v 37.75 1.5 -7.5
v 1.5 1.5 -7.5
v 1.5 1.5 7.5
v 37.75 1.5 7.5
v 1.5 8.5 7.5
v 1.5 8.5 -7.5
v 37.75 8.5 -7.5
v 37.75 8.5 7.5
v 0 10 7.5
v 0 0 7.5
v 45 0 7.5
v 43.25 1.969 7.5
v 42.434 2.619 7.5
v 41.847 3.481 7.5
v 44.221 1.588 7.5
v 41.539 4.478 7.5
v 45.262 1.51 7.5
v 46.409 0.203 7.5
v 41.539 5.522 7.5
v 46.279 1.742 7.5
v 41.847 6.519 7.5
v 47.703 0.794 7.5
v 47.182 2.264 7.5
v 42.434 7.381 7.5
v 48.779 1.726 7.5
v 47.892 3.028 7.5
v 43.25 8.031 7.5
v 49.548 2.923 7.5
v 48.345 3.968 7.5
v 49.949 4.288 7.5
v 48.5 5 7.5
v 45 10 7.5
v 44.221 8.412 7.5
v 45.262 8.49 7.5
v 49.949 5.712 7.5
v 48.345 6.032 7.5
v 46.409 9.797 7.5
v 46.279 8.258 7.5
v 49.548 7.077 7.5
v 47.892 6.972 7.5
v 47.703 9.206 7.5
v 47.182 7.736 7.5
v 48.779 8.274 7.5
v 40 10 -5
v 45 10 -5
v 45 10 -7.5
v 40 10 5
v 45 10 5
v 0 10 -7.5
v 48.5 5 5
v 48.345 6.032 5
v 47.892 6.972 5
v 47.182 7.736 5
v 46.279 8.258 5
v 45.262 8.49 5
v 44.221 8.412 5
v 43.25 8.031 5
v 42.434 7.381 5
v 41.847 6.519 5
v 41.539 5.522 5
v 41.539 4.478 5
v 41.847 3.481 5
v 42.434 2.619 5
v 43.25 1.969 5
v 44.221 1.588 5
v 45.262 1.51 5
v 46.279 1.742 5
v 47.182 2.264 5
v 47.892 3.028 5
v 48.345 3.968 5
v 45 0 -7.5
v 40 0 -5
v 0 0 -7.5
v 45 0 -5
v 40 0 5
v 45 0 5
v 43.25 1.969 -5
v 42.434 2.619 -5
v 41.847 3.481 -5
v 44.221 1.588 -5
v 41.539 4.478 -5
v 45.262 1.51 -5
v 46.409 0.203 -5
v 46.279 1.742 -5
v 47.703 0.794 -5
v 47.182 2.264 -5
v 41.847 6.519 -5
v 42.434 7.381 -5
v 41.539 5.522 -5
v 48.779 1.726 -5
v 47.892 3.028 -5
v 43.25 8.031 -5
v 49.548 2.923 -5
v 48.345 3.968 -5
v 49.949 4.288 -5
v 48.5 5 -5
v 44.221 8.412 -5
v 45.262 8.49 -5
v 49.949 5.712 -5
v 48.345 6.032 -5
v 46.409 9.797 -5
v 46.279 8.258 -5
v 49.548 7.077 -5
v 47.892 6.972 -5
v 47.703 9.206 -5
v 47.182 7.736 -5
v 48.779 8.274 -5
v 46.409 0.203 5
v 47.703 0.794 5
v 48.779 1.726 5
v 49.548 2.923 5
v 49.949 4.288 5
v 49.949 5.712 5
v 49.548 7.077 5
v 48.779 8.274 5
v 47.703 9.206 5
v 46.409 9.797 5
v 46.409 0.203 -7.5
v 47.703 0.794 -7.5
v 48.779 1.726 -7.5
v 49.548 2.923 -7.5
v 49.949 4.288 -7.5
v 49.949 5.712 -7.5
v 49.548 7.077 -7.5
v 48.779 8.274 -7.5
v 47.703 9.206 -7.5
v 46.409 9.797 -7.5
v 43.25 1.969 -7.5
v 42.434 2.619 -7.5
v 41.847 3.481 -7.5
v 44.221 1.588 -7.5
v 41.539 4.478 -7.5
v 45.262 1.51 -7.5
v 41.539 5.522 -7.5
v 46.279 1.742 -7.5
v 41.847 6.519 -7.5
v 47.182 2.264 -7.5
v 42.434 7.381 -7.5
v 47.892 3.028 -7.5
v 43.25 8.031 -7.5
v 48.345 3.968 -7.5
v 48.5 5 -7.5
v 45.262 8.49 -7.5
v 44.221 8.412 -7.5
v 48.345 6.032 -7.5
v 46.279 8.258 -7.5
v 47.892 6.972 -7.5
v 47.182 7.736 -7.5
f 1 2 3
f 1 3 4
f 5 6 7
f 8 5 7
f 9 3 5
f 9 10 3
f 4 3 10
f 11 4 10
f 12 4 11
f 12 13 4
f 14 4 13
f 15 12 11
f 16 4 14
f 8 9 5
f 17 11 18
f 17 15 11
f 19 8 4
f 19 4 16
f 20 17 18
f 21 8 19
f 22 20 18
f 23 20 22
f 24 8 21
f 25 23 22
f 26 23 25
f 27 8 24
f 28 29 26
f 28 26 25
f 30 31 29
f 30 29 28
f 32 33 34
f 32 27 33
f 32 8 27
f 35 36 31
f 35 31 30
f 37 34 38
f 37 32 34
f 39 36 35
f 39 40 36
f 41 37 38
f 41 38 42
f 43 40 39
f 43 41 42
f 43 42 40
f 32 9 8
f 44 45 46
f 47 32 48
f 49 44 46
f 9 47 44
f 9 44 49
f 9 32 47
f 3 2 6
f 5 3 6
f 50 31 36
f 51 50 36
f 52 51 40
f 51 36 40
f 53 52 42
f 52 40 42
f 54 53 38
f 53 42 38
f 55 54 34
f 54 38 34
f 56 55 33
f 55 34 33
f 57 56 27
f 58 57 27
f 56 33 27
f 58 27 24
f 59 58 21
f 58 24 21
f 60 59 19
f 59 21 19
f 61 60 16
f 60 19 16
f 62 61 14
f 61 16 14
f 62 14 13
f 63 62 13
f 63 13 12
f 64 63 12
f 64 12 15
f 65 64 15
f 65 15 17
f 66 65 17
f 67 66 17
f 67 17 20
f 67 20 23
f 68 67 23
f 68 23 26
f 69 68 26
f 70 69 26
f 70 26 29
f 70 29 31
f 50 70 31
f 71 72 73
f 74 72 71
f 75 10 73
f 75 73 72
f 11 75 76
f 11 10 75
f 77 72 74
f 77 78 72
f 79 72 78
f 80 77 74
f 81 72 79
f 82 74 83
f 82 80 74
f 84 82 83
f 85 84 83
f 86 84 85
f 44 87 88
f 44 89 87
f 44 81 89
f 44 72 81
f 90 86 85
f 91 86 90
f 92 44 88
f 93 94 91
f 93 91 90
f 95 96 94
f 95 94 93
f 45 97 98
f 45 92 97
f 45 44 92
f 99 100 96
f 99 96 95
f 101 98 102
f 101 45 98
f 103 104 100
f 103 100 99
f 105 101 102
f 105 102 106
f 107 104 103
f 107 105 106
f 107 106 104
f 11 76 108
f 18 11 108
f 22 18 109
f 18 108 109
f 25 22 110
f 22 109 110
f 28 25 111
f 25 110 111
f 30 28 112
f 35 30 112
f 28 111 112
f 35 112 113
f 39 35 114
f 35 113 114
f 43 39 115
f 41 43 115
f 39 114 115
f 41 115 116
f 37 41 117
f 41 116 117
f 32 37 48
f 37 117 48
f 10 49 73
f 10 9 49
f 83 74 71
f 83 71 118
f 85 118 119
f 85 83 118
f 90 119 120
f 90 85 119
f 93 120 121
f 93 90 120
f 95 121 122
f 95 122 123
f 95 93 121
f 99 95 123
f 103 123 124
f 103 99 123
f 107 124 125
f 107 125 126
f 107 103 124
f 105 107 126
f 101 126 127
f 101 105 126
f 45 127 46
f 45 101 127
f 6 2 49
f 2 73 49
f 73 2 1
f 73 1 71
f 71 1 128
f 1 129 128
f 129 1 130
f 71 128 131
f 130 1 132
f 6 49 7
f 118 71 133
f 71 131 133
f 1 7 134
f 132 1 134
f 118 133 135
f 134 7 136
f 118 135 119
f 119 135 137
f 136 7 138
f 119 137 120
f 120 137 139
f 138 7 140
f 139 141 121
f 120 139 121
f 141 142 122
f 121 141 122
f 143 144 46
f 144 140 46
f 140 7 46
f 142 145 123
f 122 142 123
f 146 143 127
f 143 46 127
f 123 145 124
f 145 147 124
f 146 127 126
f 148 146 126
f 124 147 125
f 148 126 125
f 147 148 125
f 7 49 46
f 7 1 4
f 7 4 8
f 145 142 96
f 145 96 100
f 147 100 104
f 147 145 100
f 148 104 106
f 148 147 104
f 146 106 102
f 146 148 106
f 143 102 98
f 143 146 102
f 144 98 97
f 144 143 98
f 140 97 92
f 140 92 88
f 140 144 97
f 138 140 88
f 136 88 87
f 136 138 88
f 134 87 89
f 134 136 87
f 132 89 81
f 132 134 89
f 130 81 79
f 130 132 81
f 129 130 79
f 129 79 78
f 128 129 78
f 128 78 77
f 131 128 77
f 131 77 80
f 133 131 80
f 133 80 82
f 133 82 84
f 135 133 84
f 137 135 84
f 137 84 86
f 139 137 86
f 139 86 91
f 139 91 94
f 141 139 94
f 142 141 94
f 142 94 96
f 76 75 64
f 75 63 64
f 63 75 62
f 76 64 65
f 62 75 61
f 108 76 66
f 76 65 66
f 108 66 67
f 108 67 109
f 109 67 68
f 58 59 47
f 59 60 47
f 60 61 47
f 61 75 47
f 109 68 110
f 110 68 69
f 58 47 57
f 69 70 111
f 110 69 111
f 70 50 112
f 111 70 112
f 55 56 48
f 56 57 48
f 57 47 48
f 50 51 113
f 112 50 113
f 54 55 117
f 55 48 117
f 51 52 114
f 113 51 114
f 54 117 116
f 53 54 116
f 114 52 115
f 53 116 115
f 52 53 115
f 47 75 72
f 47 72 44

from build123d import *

# Parameters (mm, degrees)
F0_W     = 40
F0_H     = 10
F1_DEPTH = 5
F3_DEPTH = 2.5
F4_R     = 3.5
F5_DEPTH = 7.501
F6_W     = 36.25
F6_H     = 7
F7_DEPTH = 7.501


with BuildPart() as f1:
    # F0 (on Top) → F1 (new body)
    with BuildSketch(Plane.XY):
        with Locations((20, 5)):
            Rectangle(F0_W, F0_H)
    extrude(amount=F1_DEPTH)

    # F2 (on face) → F3 (join)
    with BuildSketch(Plane.XY.offset(5)):
        with BuildLine():
            Line((40, 0), (45, 0))
            ThreePointArc((45, 0), (50, 5), (45, 10))
            Line((45, 10), (40, 10))
            Line((40, 10), (0, 10))
            Line((0, 10), (0, 0))
            Line((0, 0), (40, 0))
        make_face()
    extrude(amount=F3_DEPTH)

    # F4 (on face) → F5 (cut, through all)
    with BuildSketch(Plane.XY.offset(7.5)):
        with Locations((45, 5)):
            Circle(F4_R)
    extrude(amount=-F5_DEPTH, mode=Mode.SUBTRACT)

    # F6 (on face) → F7 (cut, through all)
    with BuildSketch(Plane.XY.offset(7.5)):
        with Locations((19.625, 5)):
            Rectangle(F6_W, F6_H)
    extrude(amount=-F7_DEPTH, mode=Mode.SUBTRACT)

    # F8: F1 across plane


with BuildPart() as f1_1:
    add(f1.part)
    add(f1.part.mirror(Plane.XY))


solid = f1_1.part
